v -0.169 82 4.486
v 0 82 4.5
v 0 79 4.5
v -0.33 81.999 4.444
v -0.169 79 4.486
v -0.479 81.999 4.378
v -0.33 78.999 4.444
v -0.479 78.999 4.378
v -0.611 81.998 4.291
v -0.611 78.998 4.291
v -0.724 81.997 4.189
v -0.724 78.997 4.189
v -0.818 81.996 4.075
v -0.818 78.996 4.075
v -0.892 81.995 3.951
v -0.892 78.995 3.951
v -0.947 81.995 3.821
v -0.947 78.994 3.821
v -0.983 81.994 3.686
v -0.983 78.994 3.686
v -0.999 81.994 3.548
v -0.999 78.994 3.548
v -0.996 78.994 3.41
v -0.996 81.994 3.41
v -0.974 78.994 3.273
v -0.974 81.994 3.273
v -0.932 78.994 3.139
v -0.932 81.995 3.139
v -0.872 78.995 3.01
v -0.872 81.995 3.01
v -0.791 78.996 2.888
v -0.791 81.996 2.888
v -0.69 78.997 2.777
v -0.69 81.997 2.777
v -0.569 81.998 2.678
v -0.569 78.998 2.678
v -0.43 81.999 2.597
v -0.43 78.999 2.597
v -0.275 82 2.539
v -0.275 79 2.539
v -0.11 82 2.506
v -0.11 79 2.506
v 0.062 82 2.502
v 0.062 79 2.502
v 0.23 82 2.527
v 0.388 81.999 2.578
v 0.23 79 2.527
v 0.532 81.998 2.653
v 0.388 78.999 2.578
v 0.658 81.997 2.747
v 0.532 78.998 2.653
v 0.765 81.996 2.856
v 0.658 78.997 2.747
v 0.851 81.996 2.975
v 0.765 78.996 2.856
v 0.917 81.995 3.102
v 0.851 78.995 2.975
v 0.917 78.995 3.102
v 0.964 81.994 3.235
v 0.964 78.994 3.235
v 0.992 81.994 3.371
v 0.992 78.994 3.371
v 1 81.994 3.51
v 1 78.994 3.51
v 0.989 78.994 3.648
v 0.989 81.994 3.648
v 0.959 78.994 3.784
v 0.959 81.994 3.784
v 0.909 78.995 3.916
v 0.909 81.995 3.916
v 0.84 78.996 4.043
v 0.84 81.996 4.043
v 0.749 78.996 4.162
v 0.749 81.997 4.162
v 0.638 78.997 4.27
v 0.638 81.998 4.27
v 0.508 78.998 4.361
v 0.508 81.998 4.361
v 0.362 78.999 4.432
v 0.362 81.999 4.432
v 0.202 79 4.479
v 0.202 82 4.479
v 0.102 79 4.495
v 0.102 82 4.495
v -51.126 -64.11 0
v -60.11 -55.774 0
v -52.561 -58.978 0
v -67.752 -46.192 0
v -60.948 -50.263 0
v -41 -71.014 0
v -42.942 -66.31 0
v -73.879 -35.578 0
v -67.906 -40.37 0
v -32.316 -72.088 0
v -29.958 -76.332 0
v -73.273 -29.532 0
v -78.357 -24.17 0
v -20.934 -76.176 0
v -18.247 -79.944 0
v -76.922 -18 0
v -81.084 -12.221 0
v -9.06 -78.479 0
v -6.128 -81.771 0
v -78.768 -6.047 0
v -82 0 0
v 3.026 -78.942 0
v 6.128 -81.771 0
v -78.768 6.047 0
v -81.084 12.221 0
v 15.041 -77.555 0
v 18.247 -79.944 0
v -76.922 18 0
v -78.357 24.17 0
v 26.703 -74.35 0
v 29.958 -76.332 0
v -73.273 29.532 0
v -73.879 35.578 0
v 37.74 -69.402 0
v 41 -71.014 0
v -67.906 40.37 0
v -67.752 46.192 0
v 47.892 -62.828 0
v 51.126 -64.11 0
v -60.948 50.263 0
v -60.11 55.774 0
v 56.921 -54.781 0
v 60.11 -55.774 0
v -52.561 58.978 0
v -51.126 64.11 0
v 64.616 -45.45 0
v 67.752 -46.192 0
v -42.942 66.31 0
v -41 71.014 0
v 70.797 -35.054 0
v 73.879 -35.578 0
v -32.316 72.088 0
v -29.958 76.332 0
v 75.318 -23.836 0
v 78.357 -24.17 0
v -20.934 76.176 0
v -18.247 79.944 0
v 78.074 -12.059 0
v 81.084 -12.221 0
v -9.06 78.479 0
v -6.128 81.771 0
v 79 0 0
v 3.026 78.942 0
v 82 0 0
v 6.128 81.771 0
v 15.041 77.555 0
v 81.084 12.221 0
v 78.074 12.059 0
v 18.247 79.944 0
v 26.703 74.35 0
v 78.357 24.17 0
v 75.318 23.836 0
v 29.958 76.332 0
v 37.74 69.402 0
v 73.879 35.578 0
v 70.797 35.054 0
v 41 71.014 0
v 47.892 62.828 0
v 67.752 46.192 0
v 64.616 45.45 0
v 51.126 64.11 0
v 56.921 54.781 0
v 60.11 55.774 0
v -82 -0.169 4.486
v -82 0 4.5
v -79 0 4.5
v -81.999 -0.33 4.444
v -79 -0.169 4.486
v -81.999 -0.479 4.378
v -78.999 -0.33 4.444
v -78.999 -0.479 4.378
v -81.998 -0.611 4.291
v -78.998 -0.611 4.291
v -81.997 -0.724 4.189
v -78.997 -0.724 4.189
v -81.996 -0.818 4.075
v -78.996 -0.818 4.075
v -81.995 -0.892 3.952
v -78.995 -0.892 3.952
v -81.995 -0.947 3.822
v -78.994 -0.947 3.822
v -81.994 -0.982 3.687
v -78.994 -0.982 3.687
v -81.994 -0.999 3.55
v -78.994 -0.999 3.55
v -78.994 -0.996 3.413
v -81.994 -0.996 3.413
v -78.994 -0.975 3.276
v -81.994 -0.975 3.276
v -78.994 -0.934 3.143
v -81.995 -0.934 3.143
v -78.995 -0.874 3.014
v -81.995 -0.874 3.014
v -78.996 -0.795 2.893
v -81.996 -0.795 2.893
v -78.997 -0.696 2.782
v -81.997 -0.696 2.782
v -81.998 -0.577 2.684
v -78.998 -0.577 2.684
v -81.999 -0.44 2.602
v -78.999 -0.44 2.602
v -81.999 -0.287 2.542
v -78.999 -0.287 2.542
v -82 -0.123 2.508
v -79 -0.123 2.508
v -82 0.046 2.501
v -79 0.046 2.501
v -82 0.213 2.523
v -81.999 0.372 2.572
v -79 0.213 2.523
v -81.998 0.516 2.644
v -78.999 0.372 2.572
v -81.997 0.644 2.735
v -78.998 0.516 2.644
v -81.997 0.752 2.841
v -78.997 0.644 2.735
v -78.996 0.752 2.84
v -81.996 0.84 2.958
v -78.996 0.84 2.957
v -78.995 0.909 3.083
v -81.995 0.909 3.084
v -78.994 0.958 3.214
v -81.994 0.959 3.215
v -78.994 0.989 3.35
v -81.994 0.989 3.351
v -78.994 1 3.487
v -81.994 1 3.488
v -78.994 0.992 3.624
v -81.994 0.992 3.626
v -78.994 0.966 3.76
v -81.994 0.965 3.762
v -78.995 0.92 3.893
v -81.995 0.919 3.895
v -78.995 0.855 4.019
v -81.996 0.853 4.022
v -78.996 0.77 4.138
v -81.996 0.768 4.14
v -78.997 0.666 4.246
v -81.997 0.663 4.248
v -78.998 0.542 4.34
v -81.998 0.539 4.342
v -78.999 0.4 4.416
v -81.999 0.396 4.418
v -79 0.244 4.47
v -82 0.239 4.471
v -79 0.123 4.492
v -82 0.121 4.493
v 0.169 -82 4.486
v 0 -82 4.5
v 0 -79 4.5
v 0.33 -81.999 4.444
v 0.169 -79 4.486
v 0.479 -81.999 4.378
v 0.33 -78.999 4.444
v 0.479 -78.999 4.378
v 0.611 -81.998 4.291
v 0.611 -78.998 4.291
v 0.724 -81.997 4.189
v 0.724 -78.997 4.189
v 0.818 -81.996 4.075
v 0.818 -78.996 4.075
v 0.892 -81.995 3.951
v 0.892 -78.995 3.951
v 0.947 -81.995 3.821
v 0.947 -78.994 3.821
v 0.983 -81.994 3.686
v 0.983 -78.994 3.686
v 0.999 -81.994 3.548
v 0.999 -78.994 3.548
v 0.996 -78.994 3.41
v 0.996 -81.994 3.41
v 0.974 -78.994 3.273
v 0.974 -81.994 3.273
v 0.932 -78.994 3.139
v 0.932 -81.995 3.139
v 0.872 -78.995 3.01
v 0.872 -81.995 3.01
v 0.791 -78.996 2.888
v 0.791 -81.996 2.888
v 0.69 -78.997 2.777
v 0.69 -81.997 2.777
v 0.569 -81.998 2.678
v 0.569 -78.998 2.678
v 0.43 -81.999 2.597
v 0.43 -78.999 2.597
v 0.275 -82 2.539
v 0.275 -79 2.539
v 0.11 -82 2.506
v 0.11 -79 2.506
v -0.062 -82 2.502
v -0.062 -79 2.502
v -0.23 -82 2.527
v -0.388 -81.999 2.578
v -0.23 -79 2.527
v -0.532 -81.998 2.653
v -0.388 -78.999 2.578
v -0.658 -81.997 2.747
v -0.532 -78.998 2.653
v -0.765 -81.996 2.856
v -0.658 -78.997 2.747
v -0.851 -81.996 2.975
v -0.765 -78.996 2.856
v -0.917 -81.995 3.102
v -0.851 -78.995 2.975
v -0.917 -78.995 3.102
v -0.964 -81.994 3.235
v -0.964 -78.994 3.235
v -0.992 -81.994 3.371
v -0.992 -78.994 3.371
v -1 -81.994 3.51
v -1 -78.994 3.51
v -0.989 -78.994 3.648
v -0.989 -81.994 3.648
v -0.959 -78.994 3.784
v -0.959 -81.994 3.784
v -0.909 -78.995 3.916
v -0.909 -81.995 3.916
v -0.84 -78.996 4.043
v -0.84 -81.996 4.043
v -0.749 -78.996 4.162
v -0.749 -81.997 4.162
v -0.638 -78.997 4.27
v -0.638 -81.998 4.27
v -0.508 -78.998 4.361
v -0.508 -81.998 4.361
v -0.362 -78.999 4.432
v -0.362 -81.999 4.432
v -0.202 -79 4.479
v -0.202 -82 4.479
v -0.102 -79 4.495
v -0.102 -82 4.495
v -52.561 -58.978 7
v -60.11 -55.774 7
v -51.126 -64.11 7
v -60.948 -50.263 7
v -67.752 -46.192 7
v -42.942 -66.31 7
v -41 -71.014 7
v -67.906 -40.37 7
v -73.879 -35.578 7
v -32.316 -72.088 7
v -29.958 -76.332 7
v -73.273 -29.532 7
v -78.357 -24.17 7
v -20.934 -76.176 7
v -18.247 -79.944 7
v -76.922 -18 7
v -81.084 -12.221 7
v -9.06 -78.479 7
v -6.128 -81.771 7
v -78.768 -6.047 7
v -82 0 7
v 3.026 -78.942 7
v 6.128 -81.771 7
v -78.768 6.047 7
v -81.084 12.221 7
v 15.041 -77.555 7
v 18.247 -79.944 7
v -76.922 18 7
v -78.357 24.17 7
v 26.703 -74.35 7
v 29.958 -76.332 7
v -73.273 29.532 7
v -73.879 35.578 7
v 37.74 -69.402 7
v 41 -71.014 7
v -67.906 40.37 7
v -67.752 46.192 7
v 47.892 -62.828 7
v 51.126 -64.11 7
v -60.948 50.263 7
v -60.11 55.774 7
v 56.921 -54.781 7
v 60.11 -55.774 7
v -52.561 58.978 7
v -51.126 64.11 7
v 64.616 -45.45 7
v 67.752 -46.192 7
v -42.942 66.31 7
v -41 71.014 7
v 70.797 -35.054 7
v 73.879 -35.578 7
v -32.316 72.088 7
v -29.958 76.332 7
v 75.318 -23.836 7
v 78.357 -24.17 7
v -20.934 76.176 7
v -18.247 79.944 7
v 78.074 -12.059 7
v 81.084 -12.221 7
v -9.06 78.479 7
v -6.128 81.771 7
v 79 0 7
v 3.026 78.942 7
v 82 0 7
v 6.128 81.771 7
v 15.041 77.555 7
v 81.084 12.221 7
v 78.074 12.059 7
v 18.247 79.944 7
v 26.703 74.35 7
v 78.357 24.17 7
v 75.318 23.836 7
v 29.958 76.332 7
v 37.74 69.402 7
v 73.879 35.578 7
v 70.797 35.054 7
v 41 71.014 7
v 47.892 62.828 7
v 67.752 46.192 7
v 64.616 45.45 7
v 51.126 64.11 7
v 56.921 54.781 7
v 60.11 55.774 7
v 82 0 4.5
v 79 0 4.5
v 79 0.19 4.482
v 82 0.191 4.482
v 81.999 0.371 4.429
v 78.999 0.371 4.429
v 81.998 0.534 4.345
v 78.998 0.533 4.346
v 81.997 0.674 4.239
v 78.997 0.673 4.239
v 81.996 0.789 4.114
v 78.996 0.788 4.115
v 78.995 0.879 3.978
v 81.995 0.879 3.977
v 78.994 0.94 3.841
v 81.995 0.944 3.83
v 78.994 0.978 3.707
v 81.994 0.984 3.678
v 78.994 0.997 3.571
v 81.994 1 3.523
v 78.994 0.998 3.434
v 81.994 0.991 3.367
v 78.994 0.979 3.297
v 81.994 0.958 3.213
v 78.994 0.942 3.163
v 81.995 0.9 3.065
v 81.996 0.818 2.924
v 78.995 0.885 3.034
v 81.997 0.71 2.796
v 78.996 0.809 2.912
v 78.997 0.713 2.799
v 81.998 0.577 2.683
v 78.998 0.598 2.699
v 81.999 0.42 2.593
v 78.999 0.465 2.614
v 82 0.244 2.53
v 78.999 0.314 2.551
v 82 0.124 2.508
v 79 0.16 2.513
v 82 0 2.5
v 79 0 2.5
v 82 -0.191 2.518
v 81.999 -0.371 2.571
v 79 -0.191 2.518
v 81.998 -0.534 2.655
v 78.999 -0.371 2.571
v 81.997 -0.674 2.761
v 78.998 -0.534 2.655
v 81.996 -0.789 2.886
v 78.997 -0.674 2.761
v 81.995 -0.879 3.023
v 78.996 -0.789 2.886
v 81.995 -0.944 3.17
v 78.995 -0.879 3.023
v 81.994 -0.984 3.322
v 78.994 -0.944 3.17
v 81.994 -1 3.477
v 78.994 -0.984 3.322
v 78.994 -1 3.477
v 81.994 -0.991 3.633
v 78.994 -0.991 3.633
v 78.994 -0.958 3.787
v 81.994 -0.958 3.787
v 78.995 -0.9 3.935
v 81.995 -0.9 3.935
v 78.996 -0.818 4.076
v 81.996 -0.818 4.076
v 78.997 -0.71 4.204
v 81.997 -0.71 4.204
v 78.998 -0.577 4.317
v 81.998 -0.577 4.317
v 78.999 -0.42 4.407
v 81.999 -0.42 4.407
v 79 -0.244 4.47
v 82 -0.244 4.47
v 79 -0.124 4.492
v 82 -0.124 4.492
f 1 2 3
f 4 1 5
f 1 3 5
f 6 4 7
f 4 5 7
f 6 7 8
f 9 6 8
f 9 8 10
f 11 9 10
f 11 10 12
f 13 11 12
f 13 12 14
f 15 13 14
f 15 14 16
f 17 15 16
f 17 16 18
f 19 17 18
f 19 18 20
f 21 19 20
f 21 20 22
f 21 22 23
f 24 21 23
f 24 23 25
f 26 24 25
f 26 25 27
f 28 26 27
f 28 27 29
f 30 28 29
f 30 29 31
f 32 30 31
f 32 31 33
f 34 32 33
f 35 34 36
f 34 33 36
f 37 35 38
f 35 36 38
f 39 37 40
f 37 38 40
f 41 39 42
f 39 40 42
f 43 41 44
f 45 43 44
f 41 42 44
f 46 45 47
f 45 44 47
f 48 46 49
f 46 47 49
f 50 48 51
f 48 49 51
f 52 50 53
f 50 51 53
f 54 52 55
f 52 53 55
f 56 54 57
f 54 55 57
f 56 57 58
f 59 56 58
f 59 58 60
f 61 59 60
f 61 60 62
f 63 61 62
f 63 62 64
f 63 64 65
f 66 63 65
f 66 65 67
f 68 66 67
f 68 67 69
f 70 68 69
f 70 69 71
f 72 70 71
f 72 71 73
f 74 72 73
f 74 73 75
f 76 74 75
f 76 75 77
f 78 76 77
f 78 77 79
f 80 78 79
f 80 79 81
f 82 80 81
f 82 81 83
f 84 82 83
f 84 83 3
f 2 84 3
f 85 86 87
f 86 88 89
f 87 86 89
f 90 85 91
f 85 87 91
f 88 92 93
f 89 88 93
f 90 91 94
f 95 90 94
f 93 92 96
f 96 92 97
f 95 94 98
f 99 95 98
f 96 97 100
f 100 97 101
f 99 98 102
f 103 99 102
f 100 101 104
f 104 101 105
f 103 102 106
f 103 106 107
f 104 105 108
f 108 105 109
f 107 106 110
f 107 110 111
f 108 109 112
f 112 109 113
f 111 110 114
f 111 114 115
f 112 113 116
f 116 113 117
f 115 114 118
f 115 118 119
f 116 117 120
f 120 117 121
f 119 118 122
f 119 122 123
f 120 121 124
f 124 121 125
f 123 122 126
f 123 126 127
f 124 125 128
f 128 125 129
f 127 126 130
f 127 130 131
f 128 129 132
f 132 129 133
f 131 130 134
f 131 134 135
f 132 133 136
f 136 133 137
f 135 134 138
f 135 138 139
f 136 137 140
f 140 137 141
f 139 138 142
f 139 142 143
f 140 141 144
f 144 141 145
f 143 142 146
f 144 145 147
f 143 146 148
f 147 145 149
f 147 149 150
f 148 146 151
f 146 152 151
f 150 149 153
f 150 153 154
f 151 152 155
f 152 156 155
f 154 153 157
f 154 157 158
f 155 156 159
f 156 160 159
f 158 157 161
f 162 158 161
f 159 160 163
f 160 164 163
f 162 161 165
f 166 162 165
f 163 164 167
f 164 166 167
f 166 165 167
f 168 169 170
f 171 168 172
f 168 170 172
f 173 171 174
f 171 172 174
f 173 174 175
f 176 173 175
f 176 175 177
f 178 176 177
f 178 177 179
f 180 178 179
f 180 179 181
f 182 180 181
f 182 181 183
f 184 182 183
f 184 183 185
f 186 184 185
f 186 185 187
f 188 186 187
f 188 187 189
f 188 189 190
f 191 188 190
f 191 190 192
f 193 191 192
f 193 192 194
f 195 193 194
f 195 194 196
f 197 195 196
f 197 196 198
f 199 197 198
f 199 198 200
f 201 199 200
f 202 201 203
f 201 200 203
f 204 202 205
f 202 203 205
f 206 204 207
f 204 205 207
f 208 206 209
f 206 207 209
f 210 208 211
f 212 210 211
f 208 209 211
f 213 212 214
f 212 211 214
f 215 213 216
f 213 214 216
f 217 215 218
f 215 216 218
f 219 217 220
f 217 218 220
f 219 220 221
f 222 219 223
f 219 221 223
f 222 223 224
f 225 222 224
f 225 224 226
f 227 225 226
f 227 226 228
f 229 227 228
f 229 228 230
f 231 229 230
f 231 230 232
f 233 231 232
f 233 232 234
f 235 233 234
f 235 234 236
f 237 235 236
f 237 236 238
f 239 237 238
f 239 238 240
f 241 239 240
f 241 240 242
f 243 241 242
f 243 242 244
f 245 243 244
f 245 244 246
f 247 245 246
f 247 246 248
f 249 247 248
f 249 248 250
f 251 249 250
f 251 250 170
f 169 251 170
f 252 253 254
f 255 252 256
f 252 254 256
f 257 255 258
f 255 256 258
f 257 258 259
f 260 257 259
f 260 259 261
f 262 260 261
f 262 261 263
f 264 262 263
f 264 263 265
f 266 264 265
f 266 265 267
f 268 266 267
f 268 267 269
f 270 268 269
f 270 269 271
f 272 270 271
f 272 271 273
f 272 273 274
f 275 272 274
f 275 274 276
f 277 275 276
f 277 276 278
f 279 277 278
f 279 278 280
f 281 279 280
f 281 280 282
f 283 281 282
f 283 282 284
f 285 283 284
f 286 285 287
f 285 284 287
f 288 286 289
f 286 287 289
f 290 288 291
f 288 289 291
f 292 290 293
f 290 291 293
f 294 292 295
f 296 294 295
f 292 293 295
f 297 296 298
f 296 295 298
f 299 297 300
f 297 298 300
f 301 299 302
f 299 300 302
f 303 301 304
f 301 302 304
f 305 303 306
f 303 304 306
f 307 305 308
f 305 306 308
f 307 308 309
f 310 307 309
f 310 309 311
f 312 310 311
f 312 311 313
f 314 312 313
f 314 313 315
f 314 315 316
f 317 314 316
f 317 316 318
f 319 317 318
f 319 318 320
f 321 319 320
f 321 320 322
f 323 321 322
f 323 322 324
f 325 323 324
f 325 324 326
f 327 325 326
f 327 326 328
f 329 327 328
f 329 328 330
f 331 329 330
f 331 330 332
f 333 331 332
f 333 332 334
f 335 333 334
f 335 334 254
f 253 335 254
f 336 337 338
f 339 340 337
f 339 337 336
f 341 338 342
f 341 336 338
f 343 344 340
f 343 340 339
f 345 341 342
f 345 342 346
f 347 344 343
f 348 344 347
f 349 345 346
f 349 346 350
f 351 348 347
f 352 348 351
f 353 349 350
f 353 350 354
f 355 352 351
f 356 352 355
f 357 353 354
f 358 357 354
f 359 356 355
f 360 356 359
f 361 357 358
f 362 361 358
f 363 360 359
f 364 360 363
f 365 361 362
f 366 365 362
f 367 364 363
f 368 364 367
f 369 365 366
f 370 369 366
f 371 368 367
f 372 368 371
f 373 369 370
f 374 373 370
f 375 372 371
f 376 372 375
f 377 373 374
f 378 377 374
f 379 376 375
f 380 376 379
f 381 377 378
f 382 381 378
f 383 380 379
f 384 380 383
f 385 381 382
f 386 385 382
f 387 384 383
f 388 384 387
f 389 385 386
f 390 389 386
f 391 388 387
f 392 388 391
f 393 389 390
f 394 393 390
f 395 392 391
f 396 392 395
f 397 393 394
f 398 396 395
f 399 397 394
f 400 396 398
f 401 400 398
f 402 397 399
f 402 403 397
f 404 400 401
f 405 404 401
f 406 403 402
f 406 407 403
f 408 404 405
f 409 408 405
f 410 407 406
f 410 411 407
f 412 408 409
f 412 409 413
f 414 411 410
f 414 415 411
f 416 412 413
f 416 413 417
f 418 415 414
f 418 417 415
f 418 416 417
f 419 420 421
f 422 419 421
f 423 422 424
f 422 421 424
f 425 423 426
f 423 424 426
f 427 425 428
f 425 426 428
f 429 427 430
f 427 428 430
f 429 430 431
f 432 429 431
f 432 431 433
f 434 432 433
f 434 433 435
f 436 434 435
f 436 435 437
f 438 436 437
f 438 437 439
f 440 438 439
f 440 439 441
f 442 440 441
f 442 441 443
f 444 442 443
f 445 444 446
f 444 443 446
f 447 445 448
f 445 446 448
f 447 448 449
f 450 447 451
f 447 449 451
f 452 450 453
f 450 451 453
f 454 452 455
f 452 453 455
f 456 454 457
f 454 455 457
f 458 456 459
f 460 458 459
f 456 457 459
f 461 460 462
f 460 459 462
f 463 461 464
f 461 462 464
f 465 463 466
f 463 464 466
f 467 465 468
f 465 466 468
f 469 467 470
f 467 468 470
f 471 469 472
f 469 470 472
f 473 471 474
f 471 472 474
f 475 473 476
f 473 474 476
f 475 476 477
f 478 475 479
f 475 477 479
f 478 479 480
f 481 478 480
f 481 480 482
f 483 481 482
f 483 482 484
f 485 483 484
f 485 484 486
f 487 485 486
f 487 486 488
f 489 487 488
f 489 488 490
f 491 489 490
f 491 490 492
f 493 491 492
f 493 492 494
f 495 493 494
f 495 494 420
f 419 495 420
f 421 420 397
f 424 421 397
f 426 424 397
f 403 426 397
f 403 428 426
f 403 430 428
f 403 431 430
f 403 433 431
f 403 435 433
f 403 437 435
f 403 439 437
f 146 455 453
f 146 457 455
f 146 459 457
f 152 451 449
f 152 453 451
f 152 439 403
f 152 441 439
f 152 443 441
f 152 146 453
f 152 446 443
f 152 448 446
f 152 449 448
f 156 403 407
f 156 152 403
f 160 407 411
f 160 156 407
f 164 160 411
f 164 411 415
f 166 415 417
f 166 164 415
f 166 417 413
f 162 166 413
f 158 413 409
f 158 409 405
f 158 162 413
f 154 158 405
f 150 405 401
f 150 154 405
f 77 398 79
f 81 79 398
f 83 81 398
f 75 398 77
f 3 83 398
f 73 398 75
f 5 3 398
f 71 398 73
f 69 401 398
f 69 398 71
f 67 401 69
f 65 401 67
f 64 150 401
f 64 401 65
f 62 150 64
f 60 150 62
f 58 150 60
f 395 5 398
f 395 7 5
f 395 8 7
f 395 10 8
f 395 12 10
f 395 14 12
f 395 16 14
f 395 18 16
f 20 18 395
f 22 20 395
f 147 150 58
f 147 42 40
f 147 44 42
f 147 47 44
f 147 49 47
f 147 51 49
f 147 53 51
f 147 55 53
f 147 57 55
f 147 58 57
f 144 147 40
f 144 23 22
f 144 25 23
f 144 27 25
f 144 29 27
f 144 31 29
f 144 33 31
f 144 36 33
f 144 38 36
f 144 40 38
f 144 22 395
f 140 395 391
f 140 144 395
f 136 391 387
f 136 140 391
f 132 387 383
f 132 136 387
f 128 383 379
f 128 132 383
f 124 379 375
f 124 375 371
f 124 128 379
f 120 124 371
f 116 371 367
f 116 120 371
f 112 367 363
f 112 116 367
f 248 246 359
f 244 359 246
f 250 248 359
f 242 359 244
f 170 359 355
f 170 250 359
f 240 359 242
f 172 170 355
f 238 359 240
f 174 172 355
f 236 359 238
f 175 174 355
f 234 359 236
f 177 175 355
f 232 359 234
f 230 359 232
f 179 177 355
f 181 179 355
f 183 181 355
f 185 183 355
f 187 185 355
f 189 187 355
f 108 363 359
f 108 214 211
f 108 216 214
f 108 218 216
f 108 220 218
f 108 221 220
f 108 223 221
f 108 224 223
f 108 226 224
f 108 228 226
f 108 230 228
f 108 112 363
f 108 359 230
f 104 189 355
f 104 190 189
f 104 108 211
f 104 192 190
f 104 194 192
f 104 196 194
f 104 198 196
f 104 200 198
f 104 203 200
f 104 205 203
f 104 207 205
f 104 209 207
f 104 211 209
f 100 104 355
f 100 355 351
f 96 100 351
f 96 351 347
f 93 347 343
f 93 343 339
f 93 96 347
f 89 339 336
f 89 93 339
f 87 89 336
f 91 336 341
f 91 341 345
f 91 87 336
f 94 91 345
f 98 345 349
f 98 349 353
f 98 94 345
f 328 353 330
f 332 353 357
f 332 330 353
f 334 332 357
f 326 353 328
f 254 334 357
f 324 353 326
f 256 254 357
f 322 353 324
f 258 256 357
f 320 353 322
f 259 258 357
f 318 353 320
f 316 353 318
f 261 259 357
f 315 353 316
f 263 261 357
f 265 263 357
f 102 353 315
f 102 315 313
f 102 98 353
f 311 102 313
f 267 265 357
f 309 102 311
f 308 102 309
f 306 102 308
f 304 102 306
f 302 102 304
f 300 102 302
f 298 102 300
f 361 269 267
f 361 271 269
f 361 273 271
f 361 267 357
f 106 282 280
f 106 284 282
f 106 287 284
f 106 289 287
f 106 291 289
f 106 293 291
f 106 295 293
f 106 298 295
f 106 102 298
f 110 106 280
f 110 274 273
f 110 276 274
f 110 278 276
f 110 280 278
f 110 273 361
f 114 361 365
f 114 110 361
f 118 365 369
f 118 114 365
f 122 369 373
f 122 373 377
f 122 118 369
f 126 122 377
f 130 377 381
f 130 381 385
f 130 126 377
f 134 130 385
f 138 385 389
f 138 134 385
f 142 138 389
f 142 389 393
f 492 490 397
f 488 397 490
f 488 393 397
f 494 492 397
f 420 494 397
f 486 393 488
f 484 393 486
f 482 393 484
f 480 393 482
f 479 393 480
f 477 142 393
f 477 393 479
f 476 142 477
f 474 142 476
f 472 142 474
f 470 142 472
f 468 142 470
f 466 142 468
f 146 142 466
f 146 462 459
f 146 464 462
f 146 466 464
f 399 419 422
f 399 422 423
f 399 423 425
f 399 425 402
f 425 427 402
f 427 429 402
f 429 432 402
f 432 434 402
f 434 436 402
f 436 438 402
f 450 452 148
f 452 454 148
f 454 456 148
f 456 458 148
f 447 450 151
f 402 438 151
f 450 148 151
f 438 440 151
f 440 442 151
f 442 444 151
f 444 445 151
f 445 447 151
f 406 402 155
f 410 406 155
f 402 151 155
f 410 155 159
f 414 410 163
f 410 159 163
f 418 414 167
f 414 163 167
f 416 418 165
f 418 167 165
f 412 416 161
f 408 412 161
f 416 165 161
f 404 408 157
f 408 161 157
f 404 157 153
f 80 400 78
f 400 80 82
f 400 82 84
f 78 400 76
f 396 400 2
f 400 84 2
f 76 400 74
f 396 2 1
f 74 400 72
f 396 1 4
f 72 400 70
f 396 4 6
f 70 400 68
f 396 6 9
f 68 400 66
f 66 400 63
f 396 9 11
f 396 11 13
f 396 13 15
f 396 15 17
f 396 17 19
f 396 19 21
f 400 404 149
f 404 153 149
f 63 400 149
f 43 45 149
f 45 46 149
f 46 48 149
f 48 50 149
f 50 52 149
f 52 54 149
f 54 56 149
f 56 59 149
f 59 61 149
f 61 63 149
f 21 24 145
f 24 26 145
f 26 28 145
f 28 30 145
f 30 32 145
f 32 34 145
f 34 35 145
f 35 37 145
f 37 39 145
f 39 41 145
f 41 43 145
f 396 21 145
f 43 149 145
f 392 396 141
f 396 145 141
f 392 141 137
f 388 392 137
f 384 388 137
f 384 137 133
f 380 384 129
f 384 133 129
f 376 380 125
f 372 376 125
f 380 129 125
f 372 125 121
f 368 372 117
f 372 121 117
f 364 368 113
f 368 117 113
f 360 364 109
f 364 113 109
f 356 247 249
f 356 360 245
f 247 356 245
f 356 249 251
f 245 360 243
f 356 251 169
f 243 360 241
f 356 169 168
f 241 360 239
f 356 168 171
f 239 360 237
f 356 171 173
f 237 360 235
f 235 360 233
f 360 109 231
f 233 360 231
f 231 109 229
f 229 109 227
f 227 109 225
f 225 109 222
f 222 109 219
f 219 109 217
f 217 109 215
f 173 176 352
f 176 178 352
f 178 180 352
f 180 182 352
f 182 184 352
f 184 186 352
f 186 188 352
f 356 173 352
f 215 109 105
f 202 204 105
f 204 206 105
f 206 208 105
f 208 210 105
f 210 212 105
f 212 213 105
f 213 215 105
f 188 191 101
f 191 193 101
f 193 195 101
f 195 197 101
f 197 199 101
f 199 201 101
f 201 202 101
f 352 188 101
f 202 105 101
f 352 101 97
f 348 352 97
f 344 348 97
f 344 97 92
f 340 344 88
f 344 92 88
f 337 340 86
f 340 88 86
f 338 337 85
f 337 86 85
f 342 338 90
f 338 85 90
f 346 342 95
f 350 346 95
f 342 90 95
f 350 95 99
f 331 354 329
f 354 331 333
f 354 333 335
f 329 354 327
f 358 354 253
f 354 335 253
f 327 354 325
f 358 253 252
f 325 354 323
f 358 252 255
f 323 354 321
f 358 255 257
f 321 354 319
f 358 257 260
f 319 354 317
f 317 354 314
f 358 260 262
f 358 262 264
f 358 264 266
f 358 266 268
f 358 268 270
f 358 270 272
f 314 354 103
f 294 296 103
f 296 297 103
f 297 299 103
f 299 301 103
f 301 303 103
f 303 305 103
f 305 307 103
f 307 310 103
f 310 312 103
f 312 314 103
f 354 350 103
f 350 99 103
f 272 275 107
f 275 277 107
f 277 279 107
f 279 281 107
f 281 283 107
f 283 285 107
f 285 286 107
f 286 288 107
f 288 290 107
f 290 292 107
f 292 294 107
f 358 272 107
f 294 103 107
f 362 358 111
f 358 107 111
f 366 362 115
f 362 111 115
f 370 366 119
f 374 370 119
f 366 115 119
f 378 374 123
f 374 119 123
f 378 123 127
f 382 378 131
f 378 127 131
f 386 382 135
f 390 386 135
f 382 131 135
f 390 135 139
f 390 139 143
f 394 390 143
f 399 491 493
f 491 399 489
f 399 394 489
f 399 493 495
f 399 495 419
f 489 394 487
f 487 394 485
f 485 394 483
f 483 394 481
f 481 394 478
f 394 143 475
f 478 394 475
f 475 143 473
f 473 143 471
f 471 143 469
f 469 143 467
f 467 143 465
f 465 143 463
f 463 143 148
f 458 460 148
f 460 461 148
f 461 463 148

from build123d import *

# Parameters (mm, degrees)
SKETCH1_R           = 82
SKETCH1_R_2         = 79
BOSS_EXTRUDE1_DEPTH = 7
SKETCH2_R           = 1
CUT_EXTRUDE1_DEPTH  = 125
CIRPATTERN1_COUNT   = 4


with BuildPart() as part:
    # Sketch1 → Boss-Extrude1 (new body)
    with BuildSketch(Plane.XY):
        Circle(SKETCH1_R)
        Circle(SKETCH1_R_2, mode=Mode.SUBTRACT)
    extrude(amount=BOSS_EXTRUDE1_DEPTH)

    # Sketch2 → Cut-Extrude1 (cut)
    with BuildSketch(Plane(origin=(0, 0, 0), x_dir=(1, 0, 0), z_dir=(0, 1, 0))):
        with Locations(Location((0, -3.5, 0), (0, 0, 270))):
            Circle(SKETCH2_R)
    cut_extrude1 = extrude(amount=-CUT_EXTRUDE1_DEPTH, mode=Mode.SUBTRACT)

    # CirPattern1: Cut-Extrude1 ×4 about axis
    cirpattern1_axis = Axis((0, 0, 0), (0, 0, 1))
    for i in range(1, CIRPATTERN1_COUNT):
        add(cut_extrude1.rotate(cirpattern1_axis, i * 360 / CIRPATTERN1_COUNT), mode=Mode.SUBTRACT)


solid = part.part
